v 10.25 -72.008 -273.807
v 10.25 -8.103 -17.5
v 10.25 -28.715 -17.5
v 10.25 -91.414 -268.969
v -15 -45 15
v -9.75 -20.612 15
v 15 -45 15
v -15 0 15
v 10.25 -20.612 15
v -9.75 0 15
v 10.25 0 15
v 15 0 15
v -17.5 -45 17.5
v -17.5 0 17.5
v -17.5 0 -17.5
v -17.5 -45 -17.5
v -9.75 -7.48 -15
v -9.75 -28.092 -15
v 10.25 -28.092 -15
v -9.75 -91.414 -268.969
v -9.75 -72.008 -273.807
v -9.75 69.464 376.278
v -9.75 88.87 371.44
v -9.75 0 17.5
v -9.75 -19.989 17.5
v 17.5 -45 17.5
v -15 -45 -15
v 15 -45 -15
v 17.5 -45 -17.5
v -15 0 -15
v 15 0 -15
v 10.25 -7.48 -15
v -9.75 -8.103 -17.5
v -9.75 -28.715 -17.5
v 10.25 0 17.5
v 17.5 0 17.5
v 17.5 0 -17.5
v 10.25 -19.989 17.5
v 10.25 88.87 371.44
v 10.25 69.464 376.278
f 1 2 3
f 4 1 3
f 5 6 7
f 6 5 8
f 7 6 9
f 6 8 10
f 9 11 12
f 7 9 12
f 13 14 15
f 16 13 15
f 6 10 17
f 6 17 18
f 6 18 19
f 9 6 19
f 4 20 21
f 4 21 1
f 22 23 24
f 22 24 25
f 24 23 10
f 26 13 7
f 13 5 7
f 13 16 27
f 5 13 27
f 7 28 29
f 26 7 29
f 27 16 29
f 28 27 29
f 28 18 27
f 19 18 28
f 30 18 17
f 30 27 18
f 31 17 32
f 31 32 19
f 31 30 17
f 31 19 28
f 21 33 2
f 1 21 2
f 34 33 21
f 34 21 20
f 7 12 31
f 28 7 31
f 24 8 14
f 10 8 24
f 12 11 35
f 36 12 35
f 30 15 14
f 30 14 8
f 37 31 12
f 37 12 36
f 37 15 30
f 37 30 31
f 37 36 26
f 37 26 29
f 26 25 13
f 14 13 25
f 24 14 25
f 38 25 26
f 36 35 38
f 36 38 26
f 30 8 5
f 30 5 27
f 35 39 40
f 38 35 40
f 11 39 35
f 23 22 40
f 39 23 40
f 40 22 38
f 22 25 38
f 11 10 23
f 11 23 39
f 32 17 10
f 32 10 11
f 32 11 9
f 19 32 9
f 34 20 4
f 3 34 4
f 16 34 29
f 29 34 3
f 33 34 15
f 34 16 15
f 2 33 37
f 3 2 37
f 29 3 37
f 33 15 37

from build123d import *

# Parameters (mm, degrees)
SKETCH1_W                = 35
SKETCH1_H                = 35
SKETCH1_W_2              = 30
SKETCH1_H_2              = 30
BOSS_EXTRUDE1_DEPTH      = 45
SKETCH5_W                = 20
SKETCH5_H                = 20
BOSS_EXTRUDE3_DEPTH      = 302.5
BOSS_EXTRUDE3_DEPTH_BACK = 362.5


with BuildPart() as part:
    # Sketch1 → Boss-Extrude1 (new body)
    with BuildSketch(Plane(origin=(0, 0, 0), x_dir=(1, 0, 0), z_dir=(0, 1, 0))):
        Rectangle(SKETCH1_W, SKETCH1_H)
        Rectangle(SKETCH1_W_2, SKETCH1_H_2, mode=Mode.SUBTRACT)
    extrude(amount=-BOSS_EXTRUDE1_DEPTH)

    # Sketch5 → Boss-Extrude3 (add, two sides)
    with BuildSketch(Plane(origin=(0, 4.694715628, 18.829475929), x_dir=(1, 0, 0), z_dir=(0, -0.241921896, -0.970295726))) as boss_extrude3_sk:
        with Locations((0.25, 13.628828434)):
            Rectangle(SKETCH5_W, SKETCH5_H)
    extrude(amount=BOSS_EXTRUDE3_DEPTH)
    extrude(boss_extrude3_sk.sketch, amount=-BOSS_EXTRUDE3_DEPTH_BACK)


solid = part.part
